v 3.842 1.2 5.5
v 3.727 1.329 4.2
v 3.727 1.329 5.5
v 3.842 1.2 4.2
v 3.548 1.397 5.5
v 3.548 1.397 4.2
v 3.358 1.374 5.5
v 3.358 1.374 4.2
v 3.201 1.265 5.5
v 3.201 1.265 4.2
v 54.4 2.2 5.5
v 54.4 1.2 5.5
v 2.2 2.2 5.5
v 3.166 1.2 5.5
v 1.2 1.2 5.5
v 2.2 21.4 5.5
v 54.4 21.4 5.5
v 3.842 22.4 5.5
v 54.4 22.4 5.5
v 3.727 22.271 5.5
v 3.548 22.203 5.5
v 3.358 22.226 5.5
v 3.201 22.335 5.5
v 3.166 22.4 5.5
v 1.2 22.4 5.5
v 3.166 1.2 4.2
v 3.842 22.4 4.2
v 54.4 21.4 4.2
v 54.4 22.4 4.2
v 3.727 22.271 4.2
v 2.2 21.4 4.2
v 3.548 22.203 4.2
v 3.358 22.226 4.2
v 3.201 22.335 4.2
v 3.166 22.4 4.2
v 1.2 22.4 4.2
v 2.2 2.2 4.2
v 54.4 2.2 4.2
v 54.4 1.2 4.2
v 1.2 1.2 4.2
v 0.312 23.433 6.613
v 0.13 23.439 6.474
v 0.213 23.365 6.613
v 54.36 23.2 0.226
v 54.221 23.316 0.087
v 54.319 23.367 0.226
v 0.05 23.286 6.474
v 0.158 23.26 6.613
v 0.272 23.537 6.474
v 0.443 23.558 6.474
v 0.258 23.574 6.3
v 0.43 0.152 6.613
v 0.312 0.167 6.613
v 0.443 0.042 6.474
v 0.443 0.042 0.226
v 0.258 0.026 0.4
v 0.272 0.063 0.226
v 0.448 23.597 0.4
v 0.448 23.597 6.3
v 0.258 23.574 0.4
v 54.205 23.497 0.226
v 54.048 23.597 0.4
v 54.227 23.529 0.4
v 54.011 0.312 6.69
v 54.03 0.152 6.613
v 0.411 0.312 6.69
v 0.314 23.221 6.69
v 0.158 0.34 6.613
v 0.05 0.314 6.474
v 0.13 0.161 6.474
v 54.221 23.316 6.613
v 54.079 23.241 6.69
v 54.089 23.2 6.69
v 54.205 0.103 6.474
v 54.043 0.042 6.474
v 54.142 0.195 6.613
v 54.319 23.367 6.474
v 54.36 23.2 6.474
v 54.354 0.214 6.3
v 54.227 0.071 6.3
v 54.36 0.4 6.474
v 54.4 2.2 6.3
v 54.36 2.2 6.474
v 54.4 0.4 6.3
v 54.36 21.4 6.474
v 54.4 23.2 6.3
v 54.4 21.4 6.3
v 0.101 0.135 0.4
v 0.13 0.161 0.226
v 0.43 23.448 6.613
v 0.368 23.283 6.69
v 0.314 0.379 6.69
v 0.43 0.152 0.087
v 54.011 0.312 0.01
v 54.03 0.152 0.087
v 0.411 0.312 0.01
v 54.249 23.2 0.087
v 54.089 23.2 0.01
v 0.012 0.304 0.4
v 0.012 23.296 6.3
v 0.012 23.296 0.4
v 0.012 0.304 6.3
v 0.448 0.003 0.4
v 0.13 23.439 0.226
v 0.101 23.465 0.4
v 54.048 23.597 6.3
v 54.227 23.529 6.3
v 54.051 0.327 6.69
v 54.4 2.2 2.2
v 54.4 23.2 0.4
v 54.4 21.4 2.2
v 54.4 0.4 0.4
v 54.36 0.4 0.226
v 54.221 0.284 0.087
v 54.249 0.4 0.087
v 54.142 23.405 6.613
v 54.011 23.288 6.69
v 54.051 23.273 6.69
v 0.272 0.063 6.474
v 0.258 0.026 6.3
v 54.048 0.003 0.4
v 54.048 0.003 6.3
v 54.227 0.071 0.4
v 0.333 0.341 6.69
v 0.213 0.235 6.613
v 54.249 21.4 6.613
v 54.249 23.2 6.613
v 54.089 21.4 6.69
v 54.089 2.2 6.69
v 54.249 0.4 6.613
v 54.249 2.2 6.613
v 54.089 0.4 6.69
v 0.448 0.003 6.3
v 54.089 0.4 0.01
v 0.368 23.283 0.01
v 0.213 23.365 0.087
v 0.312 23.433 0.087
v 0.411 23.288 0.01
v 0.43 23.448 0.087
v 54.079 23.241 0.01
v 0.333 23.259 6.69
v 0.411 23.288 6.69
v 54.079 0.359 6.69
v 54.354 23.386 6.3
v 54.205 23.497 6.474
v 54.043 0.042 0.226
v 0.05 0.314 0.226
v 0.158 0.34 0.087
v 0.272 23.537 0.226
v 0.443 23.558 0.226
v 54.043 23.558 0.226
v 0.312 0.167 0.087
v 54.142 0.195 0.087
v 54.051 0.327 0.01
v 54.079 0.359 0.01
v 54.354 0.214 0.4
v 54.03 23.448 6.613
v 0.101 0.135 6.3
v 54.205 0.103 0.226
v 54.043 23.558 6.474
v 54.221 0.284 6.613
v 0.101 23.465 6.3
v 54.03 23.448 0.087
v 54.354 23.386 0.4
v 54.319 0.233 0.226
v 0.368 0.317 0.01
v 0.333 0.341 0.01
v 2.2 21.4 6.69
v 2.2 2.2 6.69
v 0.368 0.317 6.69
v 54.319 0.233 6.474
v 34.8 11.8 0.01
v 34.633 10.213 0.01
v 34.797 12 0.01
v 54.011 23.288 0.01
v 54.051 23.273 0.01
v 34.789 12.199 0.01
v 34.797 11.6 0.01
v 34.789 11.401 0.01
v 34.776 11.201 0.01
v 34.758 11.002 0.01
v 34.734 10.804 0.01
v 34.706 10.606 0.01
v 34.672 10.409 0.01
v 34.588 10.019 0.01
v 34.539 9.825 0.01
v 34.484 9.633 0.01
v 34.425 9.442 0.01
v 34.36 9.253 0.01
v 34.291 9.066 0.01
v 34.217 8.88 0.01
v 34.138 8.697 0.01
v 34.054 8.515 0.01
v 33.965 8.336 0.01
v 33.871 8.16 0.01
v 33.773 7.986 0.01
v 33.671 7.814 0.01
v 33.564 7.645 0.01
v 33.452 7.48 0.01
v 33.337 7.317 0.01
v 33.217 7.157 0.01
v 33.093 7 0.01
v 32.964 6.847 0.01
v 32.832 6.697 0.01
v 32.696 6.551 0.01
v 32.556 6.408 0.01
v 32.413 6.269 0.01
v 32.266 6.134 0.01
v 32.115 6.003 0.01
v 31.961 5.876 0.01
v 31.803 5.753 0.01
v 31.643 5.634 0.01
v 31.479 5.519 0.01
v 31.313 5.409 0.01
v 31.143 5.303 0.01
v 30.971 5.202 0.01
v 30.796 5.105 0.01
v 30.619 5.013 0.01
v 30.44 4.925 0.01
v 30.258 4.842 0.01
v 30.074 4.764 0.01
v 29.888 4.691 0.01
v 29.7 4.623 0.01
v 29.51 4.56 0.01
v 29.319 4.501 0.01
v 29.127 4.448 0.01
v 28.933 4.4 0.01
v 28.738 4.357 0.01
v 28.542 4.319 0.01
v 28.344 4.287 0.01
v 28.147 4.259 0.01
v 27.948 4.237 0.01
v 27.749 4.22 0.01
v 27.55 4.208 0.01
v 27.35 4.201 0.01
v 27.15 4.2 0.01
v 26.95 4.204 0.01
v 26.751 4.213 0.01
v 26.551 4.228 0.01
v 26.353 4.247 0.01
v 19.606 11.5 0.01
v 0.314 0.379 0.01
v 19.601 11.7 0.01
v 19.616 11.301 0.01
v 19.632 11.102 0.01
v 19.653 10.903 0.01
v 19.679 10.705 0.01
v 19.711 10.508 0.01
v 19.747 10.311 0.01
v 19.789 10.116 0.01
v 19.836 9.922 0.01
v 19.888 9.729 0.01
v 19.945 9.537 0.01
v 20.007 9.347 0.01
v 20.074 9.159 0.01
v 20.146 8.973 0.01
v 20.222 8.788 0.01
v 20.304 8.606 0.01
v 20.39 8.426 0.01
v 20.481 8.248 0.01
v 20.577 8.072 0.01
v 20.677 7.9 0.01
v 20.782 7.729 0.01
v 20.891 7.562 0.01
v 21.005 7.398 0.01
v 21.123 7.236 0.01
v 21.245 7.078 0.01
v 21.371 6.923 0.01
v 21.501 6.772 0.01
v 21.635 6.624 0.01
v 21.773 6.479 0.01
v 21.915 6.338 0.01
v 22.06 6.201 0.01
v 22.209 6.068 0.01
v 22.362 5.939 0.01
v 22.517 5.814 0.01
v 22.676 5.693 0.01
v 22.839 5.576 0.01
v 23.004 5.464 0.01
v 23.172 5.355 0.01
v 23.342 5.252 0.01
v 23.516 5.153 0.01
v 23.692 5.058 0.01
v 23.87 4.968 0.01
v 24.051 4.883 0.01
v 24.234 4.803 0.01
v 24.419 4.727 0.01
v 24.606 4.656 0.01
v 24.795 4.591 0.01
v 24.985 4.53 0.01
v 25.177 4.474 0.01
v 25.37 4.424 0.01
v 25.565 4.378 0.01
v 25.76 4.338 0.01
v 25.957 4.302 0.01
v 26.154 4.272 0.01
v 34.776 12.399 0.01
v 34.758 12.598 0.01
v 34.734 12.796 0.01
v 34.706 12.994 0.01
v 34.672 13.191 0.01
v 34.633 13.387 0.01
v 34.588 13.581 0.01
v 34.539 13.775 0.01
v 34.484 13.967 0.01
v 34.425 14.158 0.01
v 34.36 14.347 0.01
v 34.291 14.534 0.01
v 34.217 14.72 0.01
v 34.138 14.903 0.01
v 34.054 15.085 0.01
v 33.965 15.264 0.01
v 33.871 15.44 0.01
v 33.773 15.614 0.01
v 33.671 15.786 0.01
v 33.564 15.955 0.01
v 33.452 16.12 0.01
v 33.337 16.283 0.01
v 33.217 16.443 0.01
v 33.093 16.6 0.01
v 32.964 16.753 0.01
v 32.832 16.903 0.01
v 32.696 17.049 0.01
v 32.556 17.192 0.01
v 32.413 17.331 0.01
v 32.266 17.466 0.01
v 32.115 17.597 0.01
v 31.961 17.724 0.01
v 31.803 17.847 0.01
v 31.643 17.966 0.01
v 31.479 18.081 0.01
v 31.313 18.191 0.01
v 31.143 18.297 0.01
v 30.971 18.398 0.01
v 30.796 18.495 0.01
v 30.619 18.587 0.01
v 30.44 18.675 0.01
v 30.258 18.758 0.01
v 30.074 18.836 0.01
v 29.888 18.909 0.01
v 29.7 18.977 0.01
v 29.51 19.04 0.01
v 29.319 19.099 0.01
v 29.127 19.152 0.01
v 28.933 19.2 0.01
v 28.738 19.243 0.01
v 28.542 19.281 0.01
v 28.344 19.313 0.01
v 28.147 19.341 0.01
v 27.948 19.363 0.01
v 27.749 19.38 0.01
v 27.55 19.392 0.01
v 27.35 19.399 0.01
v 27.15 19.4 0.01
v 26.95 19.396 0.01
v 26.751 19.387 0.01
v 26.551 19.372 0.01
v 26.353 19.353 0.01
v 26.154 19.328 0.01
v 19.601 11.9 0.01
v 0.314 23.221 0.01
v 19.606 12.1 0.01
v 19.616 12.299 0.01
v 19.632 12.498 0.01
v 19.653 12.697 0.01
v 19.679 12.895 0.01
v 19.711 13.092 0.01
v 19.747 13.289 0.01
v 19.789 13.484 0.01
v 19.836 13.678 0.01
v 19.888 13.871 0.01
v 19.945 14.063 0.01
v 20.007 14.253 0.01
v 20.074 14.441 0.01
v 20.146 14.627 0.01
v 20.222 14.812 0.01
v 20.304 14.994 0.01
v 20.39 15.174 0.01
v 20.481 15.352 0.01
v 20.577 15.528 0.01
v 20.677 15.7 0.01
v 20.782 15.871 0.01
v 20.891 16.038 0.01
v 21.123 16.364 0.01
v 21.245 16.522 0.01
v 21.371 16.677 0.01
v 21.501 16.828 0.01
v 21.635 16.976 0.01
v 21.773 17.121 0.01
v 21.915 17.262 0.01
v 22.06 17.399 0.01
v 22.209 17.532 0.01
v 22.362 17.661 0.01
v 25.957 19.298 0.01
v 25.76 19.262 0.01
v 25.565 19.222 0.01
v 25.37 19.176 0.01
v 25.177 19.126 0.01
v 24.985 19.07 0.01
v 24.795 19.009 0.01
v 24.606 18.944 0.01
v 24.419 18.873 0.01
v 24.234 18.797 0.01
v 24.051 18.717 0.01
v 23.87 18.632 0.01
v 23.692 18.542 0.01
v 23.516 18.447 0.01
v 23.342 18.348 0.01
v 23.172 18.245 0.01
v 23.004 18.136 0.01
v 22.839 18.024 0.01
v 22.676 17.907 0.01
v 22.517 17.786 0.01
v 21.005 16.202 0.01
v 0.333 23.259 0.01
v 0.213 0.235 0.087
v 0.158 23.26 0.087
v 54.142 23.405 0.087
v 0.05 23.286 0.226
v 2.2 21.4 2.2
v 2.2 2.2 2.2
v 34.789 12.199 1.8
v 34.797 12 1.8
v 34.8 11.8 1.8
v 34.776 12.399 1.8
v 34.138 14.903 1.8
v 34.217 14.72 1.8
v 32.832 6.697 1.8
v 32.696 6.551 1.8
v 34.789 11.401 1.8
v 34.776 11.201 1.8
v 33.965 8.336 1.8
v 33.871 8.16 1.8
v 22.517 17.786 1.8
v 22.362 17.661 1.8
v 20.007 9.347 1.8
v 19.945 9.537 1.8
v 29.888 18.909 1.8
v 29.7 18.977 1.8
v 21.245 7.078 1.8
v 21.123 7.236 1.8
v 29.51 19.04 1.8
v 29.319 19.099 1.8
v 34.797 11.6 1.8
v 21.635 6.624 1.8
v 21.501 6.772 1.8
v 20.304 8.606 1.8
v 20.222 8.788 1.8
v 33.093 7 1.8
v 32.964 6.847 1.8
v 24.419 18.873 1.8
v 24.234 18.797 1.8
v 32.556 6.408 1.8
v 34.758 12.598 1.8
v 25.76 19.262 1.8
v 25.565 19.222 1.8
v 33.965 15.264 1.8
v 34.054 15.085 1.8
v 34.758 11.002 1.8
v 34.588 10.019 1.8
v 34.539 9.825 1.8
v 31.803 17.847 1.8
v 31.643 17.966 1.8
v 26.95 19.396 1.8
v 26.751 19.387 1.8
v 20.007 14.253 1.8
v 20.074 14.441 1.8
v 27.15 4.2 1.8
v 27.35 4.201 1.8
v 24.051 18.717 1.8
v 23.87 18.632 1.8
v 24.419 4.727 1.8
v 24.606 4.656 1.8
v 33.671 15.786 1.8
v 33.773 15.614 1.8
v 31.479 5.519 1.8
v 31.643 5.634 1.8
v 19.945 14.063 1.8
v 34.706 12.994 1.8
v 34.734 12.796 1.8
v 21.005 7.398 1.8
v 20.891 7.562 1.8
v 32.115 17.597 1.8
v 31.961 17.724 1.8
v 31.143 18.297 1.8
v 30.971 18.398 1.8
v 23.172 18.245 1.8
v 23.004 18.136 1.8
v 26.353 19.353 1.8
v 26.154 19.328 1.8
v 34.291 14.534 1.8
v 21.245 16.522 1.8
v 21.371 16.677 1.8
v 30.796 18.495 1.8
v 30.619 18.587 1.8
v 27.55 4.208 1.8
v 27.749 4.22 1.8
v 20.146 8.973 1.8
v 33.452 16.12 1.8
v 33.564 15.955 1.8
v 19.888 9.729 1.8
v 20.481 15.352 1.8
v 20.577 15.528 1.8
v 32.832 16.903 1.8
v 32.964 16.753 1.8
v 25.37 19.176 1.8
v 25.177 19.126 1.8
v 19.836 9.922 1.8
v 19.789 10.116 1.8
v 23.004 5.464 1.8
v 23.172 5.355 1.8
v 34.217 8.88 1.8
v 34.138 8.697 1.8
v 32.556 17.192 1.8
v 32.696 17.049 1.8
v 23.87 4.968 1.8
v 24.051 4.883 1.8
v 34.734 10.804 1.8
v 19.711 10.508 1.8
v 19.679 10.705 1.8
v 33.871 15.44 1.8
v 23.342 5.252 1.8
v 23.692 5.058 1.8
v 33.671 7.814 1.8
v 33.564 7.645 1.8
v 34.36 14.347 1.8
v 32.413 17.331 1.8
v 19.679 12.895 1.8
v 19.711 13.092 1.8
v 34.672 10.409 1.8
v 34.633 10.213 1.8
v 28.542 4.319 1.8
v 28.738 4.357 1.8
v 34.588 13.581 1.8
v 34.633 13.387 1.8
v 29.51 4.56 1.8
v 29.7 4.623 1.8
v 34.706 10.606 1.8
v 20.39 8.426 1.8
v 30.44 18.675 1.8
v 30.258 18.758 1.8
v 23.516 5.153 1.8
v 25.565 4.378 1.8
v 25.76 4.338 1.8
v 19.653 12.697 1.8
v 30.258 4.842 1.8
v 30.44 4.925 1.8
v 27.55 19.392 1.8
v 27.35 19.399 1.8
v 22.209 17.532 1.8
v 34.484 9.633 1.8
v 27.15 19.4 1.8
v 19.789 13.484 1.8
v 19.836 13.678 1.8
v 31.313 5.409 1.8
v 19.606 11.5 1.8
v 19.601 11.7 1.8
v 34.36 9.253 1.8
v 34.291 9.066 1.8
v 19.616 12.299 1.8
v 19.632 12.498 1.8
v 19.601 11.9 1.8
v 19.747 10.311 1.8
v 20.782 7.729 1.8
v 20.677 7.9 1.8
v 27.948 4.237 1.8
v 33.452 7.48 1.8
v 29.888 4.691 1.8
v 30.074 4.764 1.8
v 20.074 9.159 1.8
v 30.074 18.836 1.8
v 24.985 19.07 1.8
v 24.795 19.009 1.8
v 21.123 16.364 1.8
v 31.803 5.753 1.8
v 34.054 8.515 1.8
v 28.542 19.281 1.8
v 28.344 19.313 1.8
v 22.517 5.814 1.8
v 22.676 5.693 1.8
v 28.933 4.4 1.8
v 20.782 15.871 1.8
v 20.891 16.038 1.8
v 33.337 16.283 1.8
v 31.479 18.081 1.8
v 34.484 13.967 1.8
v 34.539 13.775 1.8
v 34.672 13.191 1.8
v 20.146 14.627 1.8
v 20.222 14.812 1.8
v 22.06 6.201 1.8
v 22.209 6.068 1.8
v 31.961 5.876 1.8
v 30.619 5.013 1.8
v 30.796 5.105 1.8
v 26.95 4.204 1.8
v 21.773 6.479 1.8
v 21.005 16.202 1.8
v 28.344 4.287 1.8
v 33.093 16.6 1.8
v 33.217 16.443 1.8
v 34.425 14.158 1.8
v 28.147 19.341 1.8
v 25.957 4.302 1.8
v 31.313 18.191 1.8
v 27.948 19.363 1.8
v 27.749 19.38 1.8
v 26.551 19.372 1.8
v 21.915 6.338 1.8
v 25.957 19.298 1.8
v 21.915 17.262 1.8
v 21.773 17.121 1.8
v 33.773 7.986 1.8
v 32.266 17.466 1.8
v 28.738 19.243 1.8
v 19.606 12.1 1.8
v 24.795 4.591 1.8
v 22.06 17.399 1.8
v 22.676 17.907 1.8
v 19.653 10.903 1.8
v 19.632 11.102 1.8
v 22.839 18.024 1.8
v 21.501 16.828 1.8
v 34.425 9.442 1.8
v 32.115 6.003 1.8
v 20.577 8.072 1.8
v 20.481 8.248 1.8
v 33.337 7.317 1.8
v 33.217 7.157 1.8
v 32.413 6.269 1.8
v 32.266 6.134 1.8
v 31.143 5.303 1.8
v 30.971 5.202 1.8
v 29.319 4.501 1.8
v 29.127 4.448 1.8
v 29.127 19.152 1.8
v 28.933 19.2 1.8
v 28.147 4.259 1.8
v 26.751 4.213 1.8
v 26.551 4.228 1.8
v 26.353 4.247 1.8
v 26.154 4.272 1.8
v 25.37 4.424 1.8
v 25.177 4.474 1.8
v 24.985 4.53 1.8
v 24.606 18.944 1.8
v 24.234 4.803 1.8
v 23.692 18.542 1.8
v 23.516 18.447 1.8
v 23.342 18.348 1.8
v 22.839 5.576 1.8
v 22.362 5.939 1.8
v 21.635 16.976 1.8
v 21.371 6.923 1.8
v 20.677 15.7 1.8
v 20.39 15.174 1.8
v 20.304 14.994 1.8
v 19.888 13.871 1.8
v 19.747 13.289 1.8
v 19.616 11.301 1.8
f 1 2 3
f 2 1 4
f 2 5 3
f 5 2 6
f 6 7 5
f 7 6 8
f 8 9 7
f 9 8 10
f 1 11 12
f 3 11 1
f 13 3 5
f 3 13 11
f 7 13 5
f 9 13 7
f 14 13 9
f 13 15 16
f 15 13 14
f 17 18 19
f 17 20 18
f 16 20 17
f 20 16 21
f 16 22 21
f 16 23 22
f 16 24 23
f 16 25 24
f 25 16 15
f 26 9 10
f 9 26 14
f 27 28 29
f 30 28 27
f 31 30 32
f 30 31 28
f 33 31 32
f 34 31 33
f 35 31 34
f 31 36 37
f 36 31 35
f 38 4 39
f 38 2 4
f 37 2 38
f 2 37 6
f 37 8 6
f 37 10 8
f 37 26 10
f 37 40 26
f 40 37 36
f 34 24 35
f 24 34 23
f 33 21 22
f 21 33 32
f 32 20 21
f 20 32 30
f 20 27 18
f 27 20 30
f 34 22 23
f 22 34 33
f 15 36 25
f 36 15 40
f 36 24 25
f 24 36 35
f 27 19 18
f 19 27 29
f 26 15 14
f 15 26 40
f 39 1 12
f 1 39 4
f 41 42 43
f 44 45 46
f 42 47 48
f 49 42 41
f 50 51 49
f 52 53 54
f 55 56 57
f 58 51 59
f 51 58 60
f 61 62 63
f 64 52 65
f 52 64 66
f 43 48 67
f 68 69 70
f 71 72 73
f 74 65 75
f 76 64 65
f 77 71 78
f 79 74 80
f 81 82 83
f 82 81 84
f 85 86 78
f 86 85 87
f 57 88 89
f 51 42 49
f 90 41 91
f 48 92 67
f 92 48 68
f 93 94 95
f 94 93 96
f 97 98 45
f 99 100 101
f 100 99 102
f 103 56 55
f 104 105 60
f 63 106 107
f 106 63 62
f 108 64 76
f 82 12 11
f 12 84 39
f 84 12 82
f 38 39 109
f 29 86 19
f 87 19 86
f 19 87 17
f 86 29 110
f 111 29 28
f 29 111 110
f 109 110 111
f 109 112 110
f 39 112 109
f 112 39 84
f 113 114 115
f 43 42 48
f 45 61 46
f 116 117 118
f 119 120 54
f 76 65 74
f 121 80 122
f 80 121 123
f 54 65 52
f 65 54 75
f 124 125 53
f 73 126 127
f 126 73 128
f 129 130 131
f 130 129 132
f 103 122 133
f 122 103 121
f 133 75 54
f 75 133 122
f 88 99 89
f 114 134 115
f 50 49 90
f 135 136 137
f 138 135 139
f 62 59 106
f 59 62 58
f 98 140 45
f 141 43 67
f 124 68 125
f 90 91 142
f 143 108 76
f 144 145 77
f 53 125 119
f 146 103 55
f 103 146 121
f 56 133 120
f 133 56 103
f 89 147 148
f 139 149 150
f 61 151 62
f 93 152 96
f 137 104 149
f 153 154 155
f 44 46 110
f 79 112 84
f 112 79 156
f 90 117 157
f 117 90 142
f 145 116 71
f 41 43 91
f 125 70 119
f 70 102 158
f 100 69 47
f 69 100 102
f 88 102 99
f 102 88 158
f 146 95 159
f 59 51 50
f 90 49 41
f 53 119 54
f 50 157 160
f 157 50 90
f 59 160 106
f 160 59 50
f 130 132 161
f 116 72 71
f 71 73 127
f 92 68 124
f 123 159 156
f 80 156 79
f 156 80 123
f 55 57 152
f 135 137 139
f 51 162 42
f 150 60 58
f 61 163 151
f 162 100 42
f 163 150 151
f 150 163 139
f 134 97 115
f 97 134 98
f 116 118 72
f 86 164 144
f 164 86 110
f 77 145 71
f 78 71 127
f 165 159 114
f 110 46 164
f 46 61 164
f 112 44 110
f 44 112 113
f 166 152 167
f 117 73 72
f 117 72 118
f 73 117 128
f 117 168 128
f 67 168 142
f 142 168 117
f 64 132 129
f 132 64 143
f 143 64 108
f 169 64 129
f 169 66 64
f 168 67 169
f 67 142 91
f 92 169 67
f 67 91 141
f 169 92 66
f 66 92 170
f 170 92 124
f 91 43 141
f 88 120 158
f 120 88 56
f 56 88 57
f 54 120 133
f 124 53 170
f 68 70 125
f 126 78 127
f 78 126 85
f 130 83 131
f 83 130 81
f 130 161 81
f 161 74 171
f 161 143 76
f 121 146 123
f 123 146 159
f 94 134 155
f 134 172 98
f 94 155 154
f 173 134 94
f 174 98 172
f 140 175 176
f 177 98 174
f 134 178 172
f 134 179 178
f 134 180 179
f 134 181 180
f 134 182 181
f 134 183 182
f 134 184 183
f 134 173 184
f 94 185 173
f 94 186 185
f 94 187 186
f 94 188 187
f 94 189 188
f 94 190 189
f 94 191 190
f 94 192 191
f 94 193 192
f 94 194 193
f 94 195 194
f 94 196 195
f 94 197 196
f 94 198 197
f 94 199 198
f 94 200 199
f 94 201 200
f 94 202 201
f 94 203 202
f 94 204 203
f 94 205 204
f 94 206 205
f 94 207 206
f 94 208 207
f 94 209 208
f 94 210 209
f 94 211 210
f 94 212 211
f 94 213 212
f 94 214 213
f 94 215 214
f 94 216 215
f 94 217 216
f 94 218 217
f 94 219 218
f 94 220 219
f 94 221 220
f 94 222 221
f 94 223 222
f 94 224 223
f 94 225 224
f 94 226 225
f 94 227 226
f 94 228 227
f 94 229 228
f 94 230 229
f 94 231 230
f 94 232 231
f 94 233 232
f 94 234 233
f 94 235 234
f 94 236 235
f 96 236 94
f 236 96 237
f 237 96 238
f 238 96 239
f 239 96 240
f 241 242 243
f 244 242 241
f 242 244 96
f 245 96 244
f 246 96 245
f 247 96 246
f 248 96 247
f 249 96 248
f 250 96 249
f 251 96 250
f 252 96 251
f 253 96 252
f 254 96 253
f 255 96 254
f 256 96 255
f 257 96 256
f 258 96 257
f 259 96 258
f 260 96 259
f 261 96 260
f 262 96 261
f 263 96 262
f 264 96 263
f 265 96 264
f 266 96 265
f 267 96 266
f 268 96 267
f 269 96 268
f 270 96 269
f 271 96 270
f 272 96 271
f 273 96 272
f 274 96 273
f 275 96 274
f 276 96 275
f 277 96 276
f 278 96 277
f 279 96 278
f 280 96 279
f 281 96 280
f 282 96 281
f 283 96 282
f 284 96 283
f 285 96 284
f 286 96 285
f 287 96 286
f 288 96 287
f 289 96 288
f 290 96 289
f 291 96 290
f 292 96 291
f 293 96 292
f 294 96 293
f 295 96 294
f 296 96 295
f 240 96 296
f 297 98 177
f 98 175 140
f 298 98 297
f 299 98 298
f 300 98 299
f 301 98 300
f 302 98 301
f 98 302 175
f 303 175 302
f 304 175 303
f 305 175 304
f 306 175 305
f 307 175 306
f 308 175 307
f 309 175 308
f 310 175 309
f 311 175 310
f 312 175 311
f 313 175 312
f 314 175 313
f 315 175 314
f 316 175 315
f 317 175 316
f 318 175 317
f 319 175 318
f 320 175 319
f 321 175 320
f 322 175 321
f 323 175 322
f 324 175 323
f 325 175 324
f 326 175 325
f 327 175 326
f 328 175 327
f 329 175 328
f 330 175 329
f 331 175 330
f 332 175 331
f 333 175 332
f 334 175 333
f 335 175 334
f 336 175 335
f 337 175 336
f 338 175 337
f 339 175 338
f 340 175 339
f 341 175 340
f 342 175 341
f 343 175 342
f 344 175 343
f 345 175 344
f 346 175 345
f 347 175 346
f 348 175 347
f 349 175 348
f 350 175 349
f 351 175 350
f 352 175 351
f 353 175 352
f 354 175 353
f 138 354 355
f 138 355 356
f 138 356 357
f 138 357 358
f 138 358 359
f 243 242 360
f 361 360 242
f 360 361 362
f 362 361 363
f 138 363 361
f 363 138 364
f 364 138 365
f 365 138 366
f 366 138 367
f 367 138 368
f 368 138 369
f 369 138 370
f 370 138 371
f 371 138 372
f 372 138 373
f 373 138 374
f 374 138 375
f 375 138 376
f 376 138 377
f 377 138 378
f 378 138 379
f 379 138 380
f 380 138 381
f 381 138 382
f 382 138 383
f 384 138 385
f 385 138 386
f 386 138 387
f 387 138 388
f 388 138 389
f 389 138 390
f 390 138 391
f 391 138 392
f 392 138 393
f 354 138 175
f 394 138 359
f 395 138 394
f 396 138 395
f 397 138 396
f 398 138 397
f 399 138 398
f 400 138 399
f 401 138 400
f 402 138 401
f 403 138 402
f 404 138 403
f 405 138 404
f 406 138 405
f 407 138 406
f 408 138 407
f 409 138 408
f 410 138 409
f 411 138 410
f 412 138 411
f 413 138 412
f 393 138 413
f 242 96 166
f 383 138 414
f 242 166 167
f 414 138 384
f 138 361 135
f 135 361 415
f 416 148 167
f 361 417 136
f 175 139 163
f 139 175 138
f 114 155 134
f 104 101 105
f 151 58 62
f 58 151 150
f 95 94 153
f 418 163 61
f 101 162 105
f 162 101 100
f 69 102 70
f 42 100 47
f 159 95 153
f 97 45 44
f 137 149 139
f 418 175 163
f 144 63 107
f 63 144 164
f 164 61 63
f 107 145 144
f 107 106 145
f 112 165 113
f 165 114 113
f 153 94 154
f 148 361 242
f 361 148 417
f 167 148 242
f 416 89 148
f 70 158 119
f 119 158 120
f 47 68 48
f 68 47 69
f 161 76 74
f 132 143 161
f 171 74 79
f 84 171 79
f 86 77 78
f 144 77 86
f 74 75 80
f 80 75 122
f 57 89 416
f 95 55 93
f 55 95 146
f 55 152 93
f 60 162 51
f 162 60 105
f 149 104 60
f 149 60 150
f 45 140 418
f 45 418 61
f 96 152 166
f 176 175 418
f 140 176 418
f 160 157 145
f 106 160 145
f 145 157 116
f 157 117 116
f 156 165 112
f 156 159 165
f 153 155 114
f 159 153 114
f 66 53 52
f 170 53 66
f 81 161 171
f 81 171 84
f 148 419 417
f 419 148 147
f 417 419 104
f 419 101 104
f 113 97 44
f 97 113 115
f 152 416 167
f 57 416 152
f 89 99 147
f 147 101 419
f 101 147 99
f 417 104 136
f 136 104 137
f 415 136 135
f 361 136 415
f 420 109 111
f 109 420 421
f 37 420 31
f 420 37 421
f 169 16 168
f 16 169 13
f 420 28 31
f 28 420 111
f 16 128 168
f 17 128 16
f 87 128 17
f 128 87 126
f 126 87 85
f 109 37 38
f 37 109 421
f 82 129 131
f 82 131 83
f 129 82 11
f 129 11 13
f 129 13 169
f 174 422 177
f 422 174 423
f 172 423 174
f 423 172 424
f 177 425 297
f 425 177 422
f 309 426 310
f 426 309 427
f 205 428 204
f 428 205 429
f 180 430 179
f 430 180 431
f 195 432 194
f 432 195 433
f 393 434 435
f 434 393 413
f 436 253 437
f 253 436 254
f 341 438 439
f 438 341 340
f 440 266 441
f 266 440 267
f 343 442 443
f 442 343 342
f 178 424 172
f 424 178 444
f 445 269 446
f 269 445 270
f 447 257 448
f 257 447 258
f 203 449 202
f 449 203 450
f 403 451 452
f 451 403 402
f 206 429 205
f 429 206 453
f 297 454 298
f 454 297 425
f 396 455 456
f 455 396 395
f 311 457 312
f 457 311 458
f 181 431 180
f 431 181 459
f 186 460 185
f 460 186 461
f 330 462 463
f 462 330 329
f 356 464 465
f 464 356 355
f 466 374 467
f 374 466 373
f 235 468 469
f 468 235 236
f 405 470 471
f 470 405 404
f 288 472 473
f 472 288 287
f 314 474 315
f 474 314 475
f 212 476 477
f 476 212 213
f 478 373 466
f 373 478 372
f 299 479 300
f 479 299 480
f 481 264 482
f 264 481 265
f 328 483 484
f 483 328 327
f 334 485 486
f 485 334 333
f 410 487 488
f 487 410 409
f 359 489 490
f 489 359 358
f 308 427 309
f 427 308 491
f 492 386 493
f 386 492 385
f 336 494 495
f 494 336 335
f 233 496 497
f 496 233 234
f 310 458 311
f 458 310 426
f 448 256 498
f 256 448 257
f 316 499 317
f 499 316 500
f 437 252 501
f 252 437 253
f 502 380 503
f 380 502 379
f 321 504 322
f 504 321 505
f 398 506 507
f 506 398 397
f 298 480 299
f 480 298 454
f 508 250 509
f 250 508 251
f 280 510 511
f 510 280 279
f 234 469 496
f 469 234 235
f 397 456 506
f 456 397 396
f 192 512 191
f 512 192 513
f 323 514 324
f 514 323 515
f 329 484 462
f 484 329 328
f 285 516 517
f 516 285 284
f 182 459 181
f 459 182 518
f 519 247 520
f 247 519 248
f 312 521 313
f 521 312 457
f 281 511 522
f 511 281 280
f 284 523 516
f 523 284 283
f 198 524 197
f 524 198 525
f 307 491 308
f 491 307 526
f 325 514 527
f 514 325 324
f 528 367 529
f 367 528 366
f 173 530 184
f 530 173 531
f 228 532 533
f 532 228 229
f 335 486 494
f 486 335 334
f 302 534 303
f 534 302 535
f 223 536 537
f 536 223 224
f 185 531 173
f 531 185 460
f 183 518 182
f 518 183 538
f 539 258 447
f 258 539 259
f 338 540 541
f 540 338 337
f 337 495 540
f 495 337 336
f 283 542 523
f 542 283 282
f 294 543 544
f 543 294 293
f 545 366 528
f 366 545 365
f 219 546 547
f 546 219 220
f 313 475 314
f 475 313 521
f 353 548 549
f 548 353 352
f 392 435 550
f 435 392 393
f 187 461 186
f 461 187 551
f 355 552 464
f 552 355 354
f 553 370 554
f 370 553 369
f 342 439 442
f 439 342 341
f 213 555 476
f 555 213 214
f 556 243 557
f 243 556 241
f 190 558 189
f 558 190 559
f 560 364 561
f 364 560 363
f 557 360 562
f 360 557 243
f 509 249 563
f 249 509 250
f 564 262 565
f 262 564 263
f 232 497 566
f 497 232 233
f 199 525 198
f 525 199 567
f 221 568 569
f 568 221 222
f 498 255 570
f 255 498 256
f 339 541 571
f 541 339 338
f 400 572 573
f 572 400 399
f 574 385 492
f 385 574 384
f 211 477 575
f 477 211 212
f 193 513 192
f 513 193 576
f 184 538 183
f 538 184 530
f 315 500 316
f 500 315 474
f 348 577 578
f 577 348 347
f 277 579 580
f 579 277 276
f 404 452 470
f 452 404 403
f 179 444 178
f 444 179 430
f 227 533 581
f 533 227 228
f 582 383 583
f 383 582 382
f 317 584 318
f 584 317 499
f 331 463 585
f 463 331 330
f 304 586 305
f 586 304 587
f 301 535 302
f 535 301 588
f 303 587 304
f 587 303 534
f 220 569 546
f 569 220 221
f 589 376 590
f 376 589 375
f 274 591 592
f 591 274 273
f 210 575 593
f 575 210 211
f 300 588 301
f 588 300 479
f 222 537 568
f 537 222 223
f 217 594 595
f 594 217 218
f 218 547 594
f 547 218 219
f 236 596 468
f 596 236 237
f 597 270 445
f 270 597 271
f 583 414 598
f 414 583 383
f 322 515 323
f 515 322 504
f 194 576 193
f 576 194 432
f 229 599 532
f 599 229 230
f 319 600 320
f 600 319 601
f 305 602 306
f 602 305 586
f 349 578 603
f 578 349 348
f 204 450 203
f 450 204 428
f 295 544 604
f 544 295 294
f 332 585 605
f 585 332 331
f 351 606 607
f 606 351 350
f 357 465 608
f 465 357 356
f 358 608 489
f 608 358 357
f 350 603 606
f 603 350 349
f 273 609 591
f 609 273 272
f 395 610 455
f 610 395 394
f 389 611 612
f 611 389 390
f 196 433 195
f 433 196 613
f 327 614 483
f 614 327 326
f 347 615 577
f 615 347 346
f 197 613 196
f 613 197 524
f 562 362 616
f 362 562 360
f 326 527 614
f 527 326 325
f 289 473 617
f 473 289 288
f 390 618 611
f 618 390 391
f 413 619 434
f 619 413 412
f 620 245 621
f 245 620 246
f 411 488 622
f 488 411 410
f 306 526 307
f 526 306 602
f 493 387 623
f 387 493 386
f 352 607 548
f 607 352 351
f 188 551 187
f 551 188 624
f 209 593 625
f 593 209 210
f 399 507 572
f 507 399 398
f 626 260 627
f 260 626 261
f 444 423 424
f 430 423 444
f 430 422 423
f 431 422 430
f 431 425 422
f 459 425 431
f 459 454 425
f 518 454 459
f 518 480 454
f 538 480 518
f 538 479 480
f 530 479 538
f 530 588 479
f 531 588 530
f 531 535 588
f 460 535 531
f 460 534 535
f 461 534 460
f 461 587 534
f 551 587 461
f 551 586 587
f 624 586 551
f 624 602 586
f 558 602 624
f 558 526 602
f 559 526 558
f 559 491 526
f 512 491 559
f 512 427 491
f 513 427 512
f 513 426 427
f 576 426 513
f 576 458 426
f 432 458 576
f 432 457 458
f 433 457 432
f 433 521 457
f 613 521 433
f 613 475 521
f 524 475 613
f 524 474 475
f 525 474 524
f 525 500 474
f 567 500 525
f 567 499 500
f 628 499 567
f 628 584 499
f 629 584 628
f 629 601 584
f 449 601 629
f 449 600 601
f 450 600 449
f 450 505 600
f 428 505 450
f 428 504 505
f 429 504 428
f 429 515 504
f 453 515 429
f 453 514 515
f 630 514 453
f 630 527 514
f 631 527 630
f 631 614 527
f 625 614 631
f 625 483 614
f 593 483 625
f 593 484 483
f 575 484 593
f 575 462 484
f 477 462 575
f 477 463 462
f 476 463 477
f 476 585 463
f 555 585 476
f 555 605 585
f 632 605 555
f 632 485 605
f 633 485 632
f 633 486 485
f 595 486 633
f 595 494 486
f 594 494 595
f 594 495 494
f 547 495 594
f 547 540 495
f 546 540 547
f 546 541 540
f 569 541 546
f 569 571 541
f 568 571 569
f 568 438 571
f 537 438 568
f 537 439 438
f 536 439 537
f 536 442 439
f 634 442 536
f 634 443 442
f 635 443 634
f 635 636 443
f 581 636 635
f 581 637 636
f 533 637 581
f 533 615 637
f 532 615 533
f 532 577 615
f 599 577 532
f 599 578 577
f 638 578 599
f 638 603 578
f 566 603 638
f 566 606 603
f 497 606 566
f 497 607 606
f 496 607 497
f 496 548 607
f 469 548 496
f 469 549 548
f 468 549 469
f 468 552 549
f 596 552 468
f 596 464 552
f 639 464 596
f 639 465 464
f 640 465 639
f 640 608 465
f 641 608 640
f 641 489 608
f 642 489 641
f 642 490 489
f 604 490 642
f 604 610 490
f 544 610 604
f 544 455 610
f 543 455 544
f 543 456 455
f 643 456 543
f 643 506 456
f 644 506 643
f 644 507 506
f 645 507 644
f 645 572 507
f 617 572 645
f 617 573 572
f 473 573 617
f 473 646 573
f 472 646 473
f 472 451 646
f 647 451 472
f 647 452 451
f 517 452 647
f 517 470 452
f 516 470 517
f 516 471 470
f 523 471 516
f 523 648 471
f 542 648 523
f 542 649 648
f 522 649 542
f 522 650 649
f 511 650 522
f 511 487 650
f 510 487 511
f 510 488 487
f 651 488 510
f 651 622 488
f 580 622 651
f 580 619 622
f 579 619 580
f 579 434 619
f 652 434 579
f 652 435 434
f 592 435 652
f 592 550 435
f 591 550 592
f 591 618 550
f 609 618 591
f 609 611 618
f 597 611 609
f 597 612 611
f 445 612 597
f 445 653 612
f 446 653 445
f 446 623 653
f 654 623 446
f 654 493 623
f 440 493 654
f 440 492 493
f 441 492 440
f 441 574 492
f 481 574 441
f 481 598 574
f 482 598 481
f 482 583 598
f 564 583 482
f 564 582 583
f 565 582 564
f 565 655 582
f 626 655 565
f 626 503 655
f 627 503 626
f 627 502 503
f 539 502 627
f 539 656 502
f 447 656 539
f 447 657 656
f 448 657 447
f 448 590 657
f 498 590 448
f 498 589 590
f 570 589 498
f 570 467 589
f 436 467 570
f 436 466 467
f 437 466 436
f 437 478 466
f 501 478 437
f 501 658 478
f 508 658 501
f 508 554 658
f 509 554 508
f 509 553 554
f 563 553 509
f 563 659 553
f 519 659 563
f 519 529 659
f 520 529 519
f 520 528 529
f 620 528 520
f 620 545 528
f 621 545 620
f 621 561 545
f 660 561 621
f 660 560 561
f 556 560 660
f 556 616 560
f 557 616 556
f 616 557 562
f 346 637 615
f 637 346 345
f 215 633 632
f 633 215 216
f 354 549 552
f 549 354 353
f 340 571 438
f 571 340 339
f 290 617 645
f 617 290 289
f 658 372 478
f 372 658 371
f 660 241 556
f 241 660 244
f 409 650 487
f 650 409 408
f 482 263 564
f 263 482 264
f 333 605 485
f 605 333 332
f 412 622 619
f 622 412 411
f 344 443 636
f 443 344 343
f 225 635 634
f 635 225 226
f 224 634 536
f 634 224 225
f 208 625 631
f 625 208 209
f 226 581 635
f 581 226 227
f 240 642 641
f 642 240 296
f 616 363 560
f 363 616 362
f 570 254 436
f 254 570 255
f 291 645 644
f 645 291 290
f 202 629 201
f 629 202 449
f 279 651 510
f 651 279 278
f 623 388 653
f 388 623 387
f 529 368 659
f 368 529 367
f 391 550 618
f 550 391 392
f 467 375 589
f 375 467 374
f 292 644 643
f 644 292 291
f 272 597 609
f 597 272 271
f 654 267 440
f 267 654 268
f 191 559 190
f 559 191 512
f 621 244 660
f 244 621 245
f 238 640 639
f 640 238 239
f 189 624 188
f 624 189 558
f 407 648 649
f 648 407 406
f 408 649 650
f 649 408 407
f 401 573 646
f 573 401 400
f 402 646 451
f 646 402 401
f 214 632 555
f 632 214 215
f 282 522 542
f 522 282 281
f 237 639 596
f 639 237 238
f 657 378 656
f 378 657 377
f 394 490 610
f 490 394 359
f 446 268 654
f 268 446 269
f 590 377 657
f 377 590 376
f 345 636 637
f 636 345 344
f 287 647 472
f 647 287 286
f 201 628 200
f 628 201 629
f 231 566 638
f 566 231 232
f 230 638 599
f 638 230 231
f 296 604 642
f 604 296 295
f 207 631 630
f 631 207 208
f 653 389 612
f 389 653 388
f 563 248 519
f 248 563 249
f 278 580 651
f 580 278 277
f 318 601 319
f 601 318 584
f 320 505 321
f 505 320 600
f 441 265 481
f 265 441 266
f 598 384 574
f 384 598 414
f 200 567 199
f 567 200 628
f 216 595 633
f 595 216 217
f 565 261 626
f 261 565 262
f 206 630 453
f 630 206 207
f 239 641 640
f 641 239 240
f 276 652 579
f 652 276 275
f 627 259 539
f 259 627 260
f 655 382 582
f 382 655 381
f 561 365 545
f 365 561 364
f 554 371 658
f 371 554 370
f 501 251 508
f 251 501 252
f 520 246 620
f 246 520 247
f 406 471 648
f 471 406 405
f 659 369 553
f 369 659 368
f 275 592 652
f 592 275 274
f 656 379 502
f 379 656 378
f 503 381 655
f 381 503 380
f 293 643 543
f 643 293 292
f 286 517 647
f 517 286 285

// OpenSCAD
$fs=0.2;
$fa=0.5;
board_width=21.2;
board_length=52;
board_height=1.3;
component_height=2.0; //back of board
wall_thickness=1.2;
clearance=0.2;
lip_width=1;
magnet_diameter=15.2;
magnet_height=1.8;
layer_height=0.2;
rounding=0.4;
retaining_nub_diameter=0.8;
retaining_nub_offset=1.9;

module rounded_cube(dims, rounding) {
    hull() for(
        x=[rounding, dims.x-rounding],
        y=[rounding, dims.y-rounding],
        z=[rounding, dims.z-rounding]
    ) {
        translate([x, y, z]) sphere(r=rounding);
    }
}

module component_cutout() {
    translate([
        wall_thickness+lip_width,
        wall_thickness+lip_width,
        magnet_height+layer_height*2
    ]) cube([
        board_length*2-lip_width*2,
        board_width-lip_width*2,
        board_height+wall_thickness+component_height
    ]);
}

module board_cutout() {
    difference() {
        translate([
            wall_thickness,
            wall_thickness,
            magnet_height+layer_height*2+component_height
        ]) cube([
            board_length*2+wall_thickness*2,
            board_width,
            board_height
        ], rounding);
        for(y=[-clearance, board_width+clearance])translate([
            wall_thickness+retaining_nub_offset+retaining_nub_diameter/2,
            wall_thickness+y,
            magnet_height+layer_height*2+component_height
        ]) cylinder(
            h=board_height,
            d=retaining_nub_diameter
        );
    }
}


module shell() {
    rounded_cube([
        wall_thickness*2+board_length,
        wall_thickness*2+board_width,
        board_height+magnet_height+layer_height*2+component_height+wall_thickness
    ], rounding);
}

module magnet_cutout() {
    translate([
        board_length/2+wall_thickness,
        board_width/2+wall_thickness,
        0
    ]) cylinder(
        h=magnet_height,
        d=magnet_diameter
    );
}

difference() {
    shell();
    board_cutout();
    component_cutout();
    magnet_cutout();
}
//magnet_cutout();
